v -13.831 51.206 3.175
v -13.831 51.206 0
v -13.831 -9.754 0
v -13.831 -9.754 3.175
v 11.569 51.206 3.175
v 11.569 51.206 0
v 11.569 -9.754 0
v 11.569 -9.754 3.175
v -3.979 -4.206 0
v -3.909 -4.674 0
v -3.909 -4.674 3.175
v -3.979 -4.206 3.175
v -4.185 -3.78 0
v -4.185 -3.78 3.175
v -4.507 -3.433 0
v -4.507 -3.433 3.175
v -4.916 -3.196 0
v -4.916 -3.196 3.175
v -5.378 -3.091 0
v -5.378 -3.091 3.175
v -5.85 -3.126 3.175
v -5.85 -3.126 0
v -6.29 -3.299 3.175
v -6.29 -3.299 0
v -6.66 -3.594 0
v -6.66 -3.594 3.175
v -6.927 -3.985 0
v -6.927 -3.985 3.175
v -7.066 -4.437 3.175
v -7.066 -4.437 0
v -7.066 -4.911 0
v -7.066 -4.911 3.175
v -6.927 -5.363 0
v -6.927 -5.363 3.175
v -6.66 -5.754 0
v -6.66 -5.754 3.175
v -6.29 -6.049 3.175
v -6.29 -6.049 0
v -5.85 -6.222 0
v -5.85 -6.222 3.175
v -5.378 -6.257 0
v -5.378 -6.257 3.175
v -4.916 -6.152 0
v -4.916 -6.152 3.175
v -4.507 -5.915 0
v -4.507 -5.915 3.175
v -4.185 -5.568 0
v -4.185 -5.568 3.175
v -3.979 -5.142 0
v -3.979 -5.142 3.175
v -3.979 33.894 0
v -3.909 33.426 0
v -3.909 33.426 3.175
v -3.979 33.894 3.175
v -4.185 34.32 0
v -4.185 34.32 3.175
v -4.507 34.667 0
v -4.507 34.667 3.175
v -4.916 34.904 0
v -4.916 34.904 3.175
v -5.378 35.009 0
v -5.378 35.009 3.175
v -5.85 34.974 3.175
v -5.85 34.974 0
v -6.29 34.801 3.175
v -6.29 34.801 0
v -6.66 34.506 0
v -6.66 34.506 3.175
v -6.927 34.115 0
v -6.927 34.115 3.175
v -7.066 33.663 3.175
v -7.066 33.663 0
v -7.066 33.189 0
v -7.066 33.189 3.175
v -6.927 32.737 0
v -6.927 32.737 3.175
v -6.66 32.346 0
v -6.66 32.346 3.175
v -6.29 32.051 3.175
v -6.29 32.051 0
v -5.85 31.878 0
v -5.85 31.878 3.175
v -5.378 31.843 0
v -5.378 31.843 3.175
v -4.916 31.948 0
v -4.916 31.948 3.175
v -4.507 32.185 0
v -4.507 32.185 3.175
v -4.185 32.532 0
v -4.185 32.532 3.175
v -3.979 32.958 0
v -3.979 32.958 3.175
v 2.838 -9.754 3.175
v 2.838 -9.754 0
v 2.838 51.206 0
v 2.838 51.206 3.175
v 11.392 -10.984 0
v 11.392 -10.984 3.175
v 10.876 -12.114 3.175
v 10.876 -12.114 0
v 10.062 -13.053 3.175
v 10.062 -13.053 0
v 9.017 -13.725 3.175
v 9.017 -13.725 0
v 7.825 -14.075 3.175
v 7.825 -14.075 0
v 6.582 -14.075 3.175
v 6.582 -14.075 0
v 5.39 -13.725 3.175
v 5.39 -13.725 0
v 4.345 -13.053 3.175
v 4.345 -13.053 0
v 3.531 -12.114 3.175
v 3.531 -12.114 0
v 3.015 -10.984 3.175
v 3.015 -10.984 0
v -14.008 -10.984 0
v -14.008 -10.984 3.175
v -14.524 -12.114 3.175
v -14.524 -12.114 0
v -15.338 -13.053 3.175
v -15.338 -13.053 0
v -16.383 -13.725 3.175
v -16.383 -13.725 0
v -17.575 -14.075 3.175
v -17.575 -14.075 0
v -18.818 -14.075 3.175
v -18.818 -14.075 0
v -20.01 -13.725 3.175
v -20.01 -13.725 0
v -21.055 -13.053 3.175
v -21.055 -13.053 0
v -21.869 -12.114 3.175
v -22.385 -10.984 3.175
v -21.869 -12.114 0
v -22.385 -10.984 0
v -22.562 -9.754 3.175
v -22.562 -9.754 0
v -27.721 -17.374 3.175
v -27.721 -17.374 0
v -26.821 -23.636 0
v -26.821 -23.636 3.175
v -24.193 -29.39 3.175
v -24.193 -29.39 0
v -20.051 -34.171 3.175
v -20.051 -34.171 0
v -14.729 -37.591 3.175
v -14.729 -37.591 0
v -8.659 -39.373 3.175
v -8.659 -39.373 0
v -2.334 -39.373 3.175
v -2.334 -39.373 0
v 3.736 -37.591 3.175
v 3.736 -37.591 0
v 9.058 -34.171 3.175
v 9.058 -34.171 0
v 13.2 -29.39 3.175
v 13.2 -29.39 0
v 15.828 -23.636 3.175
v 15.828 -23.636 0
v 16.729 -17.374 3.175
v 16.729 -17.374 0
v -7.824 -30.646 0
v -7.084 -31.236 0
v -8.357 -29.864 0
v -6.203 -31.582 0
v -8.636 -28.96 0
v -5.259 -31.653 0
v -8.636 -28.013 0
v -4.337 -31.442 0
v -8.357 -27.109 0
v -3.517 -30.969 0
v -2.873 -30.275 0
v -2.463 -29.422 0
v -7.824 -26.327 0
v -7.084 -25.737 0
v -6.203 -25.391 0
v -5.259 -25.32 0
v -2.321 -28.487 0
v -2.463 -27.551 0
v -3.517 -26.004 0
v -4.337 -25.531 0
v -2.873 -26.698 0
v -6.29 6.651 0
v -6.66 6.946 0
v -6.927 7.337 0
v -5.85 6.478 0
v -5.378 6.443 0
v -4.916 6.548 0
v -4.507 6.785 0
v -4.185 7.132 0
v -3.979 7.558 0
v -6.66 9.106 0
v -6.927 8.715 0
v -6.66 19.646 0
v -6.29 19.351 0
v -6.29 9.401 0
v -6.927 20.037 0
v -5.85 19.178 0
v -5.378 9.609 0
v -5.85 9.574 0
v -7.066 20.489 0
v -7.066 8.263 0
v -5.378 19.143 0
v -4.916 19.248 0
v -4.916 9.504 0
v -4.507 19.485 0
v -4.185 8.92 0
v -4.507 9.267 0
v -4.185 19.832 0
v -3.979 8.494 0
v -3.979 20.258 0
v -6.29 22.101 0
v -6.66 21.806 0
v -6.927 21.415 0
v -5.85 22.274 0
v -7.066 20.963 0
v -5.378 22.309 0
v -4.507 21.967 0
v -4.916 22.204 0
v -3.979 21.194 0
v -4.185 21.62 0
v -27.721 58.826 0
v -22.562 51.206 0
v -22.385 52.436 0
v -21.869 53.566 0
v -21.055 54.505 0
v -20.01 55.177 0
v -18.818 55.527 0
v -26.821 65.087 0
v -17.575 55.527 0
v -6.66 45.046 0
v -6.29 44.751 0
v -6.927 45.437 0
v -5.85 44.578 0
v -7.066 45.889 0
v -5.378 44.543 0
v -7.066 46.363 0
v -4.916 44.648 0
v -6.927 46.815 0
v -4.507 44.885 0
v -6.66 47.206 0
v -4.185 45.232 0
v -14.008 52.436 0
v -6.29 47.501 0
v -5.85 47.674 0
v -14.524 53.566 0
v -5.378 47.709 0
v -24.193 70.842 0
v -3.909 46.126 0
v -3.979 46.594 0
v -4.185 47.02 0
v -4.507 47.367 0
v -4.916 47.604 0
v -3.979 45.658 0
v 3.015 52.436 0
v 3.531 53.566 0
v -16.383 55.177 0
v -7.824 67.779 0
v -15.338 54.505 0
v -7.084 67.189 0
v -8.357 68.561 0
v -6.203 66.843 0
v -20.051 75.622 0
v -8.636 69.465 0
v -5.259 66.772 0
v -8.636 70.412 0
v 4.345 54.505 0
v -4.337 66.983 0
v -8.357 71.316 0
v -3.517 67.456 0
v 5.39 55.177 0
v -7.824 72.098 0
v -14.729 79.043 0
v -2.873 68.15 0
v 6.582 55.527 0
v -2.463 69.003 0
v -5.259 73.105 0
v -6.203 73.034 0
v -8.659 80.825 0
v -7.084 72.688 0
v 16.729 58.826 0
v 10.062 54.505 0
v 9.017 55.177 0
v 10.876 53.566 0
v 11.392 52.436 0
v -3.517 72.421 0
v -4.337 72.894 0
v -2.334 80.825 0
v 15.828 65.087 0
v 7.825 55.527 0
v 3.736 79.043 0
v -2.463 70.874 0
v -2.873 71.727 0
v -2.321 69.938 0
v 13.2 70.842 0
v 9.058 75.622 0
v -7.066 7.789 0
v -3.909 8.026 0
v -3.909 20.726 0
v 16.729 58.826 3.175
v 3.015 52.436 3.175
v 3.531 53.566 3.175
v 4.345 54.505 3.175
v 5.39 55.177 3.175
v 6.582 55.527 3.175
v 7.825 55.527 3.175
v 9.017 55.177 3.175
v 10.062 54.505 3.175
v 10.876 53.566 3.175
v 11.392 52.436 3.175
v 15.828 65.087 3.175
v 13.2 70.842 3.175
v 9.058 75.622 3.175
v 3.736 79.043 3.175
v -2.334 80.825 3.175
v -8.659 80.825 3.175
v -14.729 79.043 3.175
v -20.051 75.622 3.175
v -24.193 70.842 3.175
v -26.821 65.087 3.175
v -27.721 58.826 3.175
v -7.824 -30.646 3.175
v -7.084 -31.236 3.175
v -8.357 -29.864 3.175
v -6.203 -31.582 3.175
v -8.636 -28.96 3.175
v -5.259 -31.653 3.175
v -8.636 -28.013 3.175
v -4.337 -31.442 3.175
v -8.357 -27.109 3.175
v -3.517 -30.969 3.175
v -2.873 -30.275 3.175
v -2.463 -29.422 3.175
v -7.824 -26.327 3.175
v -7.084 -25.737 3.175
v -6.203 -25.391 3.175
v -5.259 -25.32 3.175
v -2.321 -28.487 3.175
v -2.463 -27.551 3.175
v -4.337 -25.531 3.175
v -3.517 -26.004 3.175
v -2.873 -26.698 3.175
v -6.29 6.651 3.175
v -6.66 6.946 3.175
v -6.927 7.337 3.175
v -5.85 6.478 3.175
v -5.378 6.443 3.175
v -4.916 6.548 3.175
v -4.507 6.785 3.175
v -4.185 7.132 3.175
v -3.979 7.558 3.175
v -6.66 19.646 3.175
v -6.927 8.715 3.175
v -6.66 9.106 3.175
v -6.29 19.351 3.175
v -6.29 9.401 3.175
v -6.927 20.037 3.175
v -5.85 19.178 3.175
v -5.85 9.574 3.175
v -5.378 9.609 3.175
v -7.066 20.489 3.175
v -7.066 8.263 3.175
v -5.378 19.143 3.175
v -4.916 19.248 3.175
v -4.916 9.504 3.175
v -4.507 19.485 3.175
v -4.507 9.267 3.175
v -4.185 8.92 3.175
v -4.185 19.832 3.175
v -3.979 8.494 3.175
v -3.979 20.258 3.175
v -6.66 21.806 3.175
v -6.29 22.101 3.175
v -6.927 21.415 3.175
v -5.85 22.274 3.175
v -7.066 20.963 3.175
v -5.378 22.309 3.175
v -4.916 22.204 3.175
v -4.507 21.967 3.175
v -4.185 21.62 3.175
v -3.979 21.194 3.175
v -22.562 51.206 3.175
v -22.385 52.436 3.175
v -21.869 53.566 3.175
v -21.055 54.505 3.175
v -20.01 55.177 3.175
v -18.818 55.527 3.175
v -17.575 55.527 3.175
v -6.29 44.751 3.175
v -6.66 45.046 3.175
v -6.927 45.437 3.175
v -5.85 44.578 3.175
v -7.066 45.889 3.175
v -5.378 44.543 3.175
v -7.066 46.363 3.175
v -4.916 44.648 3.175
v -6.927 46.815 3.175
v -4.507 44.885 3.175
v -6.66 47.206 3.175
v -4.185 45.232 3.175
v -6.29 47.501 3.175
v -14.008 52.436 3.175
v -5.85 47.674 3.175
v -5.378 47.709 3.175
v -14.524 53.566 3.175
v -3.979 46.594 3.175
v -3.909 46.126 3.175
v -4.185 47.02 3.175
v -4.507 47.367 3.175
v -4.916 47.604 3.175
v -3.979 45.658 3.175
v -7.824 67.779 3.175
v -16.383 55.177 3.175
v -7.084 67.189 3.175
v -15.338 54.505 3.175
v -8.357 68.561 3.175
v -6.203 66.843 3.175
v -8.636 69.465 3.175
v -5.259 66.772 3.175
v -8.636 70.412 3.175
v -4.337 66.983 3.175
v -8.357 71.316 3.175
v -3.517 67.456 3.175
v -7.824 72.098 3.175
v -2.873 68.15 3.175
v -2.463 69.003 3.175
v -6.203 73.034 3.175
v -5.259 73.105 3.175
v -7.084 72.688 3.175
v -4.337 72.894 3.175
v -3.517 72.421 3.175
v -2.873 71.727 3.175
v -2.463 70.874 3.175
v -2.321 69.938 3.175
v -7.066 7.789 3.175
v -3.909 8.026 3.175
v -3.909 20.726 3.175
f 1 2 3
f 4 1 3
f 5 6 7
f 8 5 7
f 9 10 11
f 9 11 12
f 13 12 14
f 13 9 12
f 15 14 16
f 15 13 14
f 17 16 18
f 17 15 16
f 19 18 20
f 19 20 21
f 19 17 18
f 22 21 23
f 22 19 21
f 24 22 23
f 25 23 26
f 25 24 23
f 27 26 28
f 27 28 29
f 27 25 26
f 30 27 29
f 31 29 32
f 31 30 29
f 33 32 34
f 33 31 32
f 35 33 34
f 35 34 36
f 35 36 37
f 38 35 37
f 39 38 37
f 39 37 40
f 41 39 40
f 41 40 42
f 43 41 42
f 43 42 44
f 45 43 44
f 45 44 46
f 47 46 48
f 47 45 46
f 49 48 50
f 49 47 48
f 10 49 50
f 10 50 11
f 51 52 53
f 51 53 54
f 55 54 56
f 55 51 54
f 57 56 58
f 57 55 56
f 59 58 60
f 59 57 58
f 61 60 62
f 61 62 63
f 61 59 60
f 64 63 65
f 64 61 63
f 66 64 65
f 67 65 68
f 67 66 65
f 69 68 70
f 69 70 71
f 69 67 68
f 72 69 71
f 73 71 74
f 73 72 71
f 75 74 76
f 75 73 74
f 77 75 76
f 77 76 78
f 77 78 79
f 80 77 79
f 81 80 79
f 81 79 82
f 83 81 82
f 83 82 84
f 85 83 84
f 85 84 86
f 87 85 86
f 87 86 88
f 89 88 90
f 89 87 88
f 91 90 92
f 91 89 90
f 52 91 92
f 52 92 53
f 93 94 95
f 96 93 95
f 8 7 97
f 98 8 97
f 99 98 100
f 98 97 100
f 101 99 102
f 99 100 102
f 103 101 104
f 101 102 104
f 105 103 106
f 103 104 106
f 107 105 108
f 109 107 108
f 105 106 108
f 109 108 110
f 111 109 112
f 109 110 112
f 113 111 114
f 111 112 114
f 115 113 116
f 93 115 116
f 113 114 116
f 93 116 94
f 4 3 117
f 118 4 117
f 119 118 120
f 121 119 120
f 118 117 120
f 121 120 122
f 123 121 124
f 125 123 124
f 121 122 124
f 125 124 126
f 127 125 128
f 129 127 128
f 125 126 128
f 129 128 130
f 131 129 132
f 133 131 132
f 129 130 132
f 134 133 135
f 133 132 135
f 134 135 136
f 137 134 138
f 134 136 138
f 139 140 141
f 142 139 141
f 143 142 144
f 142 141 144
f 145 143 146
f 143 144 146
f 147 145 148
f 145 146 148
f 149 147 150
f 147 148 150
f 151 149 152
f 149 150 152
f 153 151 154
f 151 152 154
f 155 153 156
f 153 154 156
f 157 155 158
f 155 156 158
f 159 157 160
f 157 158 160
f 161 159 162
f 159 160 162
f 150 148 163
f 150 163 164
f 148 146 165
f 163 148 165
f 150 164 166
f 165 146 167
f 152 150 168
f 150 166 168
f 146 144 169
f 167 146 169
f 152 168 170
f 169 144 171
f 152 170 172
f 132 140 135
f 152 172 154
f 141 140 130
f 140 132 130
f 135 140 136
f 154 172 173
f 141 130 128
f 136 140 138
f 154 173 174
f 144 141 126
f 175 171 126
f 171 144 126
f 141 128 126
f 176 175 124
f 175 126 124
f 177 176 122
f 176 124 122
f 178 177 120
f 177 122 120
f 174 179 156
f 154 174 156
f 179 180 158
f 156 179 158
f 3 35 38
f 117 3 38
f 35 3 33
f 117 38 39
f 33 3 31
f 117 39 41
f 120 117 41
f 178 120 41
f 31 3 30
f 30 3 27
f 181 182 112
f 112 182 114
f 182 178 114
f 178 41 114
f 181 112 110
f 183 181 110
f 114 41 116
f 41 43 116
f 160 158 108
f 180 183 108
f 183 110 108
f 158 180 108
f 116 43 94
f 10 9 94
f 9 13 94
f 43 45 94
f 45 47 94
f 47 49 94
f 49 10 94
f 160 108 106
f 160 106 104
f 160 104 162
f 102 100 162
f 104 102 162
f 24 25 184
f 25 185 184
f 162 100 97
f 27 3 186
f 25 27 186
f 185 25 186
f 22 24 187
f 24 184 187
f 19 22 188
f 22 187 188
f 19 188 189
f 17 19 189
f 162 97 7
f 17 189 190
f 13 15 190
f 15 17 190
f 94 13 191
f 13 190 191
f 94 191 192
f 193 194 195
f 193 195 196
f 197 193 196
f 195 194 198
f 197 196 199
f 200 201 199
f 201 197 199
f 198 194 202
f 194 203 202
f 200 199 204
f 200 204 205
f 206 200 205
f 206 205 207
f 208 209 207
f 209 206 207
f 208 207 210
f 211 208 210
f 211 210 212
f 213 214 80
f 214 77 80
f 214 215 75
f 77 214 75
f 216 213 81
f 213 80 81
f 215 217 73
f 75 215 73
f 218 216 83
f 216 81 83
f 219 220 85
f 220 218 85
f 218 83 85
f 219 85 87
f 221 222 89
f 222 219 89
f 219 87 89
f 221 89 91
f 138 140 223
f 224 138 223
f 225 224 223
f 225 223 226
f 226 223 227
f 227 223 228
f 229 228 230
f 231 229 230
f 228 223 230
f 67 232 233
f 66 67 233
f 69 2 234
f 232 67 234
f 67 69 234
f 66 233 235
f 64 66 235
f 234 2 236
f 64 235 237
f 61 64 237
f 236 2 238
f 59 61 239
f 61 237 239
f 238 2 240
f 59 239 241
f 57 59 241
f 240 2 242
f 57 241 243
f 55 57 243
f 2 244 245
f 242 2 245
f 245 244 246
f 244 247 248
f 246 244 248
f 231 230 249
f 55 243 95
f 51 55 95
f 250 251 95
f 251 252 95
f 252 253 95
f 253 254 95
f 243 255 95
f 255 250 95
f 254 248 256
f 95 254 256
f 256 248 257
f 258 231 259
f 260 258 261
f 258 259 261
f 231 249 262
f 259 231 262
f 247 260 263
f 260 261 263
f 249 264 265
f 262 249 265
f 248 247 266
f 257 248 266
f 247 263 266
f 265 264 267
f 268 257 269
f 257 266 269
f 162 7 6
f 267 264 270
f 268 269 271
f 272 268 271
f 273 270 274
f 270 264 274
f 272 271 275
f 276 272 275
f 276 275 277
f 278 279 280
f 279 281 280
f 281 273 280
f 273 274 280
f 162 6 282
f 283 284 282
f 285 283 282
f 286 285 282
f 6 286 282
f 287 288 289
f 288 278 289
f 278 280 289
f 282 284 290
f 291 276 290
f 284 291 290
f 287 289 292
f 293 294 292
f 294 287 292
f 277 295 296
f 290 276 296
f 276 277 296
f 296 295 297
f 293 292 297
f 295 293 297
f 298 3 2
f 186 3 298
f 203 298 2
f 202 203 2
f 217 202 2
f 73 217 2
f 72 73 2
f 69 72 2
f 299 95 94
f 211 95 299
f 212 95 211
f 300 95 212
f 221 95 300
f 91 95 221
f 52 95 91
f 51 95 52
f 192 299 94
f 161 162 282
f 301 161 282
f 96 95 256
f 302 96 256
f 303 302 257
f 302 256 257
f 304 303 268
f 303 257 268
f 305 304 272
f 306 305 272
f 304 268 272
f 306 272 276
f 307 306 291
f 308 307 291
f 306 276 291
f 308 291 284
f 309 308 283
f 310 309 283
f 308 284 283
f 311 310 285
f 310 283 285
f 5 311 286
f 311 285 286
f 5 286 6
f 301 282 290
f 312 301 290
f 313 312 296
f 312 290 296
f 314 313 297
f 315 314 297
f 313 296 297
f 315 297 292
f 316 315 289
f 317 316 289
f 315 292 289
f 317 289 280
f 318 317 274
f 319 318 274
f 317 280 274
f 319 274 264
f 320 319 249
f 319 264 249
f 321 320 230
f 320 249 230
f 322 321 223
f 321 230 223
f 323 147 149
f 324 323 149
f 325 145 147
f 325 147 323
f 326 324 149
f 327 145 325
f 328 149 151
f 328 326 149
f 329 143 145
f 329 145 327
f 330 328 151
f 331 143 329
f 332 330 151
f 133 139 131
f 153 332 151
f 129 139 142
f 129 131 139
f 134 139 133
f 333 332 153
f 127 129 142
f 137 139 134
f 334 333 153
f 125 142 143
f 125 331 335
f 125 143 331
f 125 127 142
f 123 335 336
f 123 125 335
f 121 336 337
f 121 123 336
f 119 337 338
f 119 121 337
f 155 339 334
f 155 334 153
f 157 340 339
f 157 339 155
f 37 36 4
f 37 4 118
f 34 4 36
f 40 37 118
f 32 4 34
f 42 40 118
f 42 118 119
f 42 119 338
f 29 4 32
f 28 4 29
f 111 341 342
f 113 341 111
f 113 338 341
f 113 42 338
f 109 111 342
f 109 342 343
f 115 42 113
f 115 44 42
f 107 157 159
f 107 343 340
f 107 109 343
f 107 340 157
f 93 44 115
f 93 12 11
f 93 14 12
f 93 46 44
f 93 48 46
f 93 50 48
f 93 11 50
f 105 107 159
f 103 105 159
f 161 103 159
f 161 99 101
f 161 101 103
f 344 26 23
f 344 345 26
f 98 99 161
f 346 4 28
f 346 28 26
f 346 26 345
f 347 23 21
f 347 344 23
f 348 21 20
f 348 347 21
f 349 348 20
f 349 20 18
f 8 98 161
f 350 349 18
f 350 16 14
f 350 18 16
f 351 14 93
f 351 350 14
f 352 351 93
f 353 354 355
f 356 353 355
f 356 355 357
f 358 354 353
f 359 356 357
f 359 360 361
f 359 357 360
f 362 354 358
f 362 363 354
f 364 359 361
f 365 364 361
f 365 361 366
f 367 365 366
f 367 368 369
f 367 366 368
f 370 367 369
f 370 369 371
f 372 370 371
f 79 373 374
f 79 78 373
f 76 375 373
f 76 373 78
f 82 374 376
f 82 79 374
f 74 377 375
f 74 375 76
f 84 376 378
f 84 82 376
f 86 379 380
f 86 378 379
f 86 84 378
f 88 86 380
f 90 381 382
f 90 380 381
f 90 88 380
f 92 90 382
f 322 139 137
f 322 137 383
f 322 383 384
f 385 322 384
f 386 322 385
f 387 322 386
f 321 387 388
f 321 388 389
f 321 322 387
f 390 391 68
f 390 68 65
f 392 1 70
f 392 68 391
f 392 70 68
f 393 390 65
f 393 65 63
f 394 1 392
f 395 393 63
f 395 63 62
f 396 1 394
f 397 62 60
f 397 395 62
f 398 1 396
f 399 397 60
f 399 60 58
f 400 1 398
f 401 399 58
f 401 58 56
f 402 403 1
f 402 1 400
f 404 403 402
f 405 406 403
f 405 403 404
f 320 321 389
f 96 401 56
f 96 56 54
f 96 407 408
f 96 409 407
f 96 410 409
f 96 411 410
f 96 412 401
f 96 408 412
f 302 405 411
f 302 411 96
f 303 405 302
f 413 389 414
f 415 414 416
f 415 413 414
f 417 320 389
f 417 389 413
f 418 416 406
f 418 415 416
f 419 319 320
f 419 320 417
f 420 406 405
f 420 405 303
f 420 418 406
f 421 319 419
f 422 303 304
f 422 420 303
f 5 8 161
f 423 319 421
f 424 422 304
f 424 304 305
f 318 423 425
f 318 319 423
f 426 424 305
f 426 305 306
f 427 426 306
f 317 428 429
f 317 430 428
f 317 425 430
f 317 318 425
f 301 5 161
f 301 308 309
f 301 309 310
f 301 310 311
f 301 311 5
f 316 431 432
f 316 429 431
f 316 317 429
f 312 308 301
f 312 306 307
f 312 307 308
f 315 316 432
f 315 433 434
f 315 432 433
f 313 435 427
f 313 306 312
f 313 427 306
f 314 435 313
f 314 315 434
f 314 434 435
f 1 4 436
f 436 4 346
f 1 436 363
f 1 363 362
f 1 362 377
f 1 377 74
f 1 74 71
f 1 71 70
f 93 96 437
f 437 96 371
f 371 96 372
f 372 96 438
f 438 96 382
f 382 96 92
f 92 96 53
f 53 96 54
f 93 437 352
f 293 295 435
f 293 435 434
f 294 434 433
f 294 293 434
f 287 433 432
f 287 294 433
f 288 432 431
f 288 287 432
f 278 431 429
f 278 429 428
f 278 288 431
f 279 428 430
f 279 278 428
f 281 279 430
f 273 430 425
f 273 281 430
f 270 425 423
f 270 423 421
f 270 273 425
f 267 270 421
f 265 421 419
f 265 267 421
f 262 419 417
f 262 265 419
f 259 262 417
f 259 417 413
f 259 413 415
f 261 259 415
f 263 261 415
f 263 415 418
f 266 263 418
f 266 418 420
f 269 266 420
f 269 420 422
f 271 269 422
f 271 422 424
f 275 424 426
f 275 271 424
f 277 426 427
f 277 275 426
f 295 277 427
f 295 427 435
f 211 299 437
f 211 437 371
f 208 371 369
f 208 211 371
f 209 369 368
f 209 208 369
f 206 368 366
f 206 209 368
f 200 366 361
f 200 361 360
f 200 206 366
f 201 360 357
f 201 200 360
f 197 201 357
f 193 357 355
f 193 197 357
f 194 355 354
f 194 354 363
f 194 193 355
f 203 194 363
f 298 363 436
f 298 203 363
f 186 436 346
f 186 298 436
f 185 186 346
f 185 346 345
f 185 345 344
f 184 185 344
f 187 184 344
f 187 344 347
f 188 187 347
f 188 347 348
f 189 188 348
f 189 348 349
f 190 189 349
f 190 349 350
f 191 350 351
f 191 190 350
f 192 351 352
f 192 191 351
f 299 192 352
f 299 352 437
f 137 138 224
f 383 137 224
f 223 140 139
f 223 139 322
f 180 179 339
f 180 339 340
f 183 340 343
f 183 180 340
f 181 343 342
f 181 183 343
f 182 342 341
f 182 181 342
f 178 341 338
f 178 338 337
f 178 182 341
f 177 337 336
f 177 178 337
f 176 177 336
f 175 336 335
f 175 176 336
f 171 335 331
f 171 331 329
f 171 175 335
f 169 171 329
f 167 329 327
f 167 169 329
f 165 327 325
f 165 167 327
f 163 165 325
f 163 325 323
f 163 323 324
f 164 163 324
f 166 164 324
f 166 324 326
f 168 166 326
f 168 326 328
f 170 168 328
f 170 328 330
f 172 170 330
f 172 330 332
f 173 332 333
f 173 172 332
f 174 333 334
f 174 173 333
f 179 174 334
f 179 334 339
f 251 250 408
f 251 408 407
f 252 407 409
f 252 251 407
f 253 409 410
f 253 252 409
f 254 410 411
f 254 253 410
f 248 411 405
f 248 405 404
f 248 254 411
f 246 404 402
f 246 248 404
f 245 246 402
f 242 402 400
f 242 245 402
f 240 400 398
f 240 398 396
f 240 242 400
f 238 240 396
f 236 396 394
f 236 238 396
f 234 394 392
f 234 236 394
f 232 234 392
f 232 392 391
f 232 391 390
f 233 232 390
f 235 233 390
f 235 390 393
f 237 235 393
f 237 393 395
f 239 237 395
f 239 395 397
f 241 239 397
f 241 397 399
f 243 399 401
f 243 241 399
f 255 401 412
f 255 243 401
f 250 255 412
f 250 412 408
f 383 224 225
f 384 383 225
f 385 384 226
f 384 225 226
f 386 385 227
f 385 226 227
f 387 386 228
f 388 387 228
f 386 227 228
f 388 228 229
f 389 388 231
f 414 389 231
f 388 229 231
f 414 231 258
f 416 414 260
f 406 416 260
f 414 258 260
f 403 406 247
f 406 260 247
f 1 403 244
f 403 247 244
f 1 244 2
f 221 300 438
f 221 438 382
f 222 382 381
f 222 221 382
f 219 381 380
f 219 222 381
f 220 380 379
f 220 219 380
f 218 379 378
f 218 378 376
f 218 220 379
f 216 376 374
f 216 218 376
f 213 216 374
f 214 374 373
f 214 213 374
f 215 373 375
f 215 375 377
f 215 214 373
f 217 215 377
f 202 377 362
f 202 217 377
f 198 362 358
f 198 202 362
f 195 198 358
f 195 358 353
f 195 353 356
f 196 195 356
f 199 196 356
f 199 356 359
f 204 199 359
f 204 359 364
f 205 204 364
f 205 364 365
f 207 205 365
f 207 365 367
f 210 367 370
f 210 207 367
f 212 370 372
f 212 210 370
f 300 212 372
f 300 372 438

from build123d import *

# Parameters (mm, degrees)
F0_R     = 3.175
F0_W     = 44.45
F0_H     = 76.2
F0_R_2   = 1.5875
F1_DEPTH = 3.175


with BuildPart() as f1:
    # F0 (on Top) → F1 (new body)
    with BuildSketch(Plane.XY):
        with BuildLine():
            ThreePointArc((16.728534, 58.82596), (-5.496466, 81.05096), (-27.721466, 58.82596))
            Line((-27.721466, 58.82596), (16.728534, 58.82596))
        make_face()
        with Locations((-5.496466, 69.93846)):
            Circle(F0_R, mode=Mode.SUBTRACT)
        with Locations((-5.496466, 20.72596)):
            Rectangle(F0_W, F0_H)
        with Locations((-5.496466, -4.67404)):
            Circle(F0_R_2, mode=Mode.SUBTRACT)
        with Locations((-5.496466, 8.02596)):
            Circle(F0_R_2, mode=Mode.SUBTRACT)
        with BuildLine():
            Line((-22.562091, -9.75404), (-22.562091, 51.20596))
            ThreePointArc((-22.562091, 51.20596), (-18.196466, 55.571585), (-13.830841, 51.20596))
            Line((-13.830841, 51.20596), (-13.830841, -9.75404))
            ThreePointArc((-13.830841, -9.75404), (-18.196466, -14.119665), (-22.562091, -9.75404))
        make_face(mode=Mode.SUBTRACT)
        with Locations((-5.496466, 46.12596)):
            Circle(F0_R_2, mode=Mode.SUBTRACT)
        with Locations((-5.496466, 20.72596)):
            Circle(F0_R_2, mode=Mode.SUBTRACT)
        with Locations((-5.496466, 33.42596)):
            Circle(F0_R_2, mode=Mode.SUBTRACT)
        with BuildLine():
            Line((2.837909, -9.75404), (2.837909, 51.20596))
            ThreePointArc((2.837909, 51.20596), (7.203534, 55.571585), (11.569159, 51.20596))
            Line((11.569159, 51.20596), (11.569159, -9.75404))
            ThreePointArc((11.569159, -9.75404), (7.203534, -14.119665), (2.837909, -9.75404))
        make_face(mode=Mode.SUBTRACT)
        with BuildLine():
            Line((16.728534, -17.37404), (-27.721466, -17.37404))
            ThreePointArc((-27.721466, -17.37404), (-5.496466, -39.59904), (16.728534, -17.37404))
        make_face()
        with Locations((-5.496466, -28.48654)):
            Circle(F0_R, mode=Mode.SUBTRACT)
    extrude(amount=F1_DEPTH)


solid = f1.part
